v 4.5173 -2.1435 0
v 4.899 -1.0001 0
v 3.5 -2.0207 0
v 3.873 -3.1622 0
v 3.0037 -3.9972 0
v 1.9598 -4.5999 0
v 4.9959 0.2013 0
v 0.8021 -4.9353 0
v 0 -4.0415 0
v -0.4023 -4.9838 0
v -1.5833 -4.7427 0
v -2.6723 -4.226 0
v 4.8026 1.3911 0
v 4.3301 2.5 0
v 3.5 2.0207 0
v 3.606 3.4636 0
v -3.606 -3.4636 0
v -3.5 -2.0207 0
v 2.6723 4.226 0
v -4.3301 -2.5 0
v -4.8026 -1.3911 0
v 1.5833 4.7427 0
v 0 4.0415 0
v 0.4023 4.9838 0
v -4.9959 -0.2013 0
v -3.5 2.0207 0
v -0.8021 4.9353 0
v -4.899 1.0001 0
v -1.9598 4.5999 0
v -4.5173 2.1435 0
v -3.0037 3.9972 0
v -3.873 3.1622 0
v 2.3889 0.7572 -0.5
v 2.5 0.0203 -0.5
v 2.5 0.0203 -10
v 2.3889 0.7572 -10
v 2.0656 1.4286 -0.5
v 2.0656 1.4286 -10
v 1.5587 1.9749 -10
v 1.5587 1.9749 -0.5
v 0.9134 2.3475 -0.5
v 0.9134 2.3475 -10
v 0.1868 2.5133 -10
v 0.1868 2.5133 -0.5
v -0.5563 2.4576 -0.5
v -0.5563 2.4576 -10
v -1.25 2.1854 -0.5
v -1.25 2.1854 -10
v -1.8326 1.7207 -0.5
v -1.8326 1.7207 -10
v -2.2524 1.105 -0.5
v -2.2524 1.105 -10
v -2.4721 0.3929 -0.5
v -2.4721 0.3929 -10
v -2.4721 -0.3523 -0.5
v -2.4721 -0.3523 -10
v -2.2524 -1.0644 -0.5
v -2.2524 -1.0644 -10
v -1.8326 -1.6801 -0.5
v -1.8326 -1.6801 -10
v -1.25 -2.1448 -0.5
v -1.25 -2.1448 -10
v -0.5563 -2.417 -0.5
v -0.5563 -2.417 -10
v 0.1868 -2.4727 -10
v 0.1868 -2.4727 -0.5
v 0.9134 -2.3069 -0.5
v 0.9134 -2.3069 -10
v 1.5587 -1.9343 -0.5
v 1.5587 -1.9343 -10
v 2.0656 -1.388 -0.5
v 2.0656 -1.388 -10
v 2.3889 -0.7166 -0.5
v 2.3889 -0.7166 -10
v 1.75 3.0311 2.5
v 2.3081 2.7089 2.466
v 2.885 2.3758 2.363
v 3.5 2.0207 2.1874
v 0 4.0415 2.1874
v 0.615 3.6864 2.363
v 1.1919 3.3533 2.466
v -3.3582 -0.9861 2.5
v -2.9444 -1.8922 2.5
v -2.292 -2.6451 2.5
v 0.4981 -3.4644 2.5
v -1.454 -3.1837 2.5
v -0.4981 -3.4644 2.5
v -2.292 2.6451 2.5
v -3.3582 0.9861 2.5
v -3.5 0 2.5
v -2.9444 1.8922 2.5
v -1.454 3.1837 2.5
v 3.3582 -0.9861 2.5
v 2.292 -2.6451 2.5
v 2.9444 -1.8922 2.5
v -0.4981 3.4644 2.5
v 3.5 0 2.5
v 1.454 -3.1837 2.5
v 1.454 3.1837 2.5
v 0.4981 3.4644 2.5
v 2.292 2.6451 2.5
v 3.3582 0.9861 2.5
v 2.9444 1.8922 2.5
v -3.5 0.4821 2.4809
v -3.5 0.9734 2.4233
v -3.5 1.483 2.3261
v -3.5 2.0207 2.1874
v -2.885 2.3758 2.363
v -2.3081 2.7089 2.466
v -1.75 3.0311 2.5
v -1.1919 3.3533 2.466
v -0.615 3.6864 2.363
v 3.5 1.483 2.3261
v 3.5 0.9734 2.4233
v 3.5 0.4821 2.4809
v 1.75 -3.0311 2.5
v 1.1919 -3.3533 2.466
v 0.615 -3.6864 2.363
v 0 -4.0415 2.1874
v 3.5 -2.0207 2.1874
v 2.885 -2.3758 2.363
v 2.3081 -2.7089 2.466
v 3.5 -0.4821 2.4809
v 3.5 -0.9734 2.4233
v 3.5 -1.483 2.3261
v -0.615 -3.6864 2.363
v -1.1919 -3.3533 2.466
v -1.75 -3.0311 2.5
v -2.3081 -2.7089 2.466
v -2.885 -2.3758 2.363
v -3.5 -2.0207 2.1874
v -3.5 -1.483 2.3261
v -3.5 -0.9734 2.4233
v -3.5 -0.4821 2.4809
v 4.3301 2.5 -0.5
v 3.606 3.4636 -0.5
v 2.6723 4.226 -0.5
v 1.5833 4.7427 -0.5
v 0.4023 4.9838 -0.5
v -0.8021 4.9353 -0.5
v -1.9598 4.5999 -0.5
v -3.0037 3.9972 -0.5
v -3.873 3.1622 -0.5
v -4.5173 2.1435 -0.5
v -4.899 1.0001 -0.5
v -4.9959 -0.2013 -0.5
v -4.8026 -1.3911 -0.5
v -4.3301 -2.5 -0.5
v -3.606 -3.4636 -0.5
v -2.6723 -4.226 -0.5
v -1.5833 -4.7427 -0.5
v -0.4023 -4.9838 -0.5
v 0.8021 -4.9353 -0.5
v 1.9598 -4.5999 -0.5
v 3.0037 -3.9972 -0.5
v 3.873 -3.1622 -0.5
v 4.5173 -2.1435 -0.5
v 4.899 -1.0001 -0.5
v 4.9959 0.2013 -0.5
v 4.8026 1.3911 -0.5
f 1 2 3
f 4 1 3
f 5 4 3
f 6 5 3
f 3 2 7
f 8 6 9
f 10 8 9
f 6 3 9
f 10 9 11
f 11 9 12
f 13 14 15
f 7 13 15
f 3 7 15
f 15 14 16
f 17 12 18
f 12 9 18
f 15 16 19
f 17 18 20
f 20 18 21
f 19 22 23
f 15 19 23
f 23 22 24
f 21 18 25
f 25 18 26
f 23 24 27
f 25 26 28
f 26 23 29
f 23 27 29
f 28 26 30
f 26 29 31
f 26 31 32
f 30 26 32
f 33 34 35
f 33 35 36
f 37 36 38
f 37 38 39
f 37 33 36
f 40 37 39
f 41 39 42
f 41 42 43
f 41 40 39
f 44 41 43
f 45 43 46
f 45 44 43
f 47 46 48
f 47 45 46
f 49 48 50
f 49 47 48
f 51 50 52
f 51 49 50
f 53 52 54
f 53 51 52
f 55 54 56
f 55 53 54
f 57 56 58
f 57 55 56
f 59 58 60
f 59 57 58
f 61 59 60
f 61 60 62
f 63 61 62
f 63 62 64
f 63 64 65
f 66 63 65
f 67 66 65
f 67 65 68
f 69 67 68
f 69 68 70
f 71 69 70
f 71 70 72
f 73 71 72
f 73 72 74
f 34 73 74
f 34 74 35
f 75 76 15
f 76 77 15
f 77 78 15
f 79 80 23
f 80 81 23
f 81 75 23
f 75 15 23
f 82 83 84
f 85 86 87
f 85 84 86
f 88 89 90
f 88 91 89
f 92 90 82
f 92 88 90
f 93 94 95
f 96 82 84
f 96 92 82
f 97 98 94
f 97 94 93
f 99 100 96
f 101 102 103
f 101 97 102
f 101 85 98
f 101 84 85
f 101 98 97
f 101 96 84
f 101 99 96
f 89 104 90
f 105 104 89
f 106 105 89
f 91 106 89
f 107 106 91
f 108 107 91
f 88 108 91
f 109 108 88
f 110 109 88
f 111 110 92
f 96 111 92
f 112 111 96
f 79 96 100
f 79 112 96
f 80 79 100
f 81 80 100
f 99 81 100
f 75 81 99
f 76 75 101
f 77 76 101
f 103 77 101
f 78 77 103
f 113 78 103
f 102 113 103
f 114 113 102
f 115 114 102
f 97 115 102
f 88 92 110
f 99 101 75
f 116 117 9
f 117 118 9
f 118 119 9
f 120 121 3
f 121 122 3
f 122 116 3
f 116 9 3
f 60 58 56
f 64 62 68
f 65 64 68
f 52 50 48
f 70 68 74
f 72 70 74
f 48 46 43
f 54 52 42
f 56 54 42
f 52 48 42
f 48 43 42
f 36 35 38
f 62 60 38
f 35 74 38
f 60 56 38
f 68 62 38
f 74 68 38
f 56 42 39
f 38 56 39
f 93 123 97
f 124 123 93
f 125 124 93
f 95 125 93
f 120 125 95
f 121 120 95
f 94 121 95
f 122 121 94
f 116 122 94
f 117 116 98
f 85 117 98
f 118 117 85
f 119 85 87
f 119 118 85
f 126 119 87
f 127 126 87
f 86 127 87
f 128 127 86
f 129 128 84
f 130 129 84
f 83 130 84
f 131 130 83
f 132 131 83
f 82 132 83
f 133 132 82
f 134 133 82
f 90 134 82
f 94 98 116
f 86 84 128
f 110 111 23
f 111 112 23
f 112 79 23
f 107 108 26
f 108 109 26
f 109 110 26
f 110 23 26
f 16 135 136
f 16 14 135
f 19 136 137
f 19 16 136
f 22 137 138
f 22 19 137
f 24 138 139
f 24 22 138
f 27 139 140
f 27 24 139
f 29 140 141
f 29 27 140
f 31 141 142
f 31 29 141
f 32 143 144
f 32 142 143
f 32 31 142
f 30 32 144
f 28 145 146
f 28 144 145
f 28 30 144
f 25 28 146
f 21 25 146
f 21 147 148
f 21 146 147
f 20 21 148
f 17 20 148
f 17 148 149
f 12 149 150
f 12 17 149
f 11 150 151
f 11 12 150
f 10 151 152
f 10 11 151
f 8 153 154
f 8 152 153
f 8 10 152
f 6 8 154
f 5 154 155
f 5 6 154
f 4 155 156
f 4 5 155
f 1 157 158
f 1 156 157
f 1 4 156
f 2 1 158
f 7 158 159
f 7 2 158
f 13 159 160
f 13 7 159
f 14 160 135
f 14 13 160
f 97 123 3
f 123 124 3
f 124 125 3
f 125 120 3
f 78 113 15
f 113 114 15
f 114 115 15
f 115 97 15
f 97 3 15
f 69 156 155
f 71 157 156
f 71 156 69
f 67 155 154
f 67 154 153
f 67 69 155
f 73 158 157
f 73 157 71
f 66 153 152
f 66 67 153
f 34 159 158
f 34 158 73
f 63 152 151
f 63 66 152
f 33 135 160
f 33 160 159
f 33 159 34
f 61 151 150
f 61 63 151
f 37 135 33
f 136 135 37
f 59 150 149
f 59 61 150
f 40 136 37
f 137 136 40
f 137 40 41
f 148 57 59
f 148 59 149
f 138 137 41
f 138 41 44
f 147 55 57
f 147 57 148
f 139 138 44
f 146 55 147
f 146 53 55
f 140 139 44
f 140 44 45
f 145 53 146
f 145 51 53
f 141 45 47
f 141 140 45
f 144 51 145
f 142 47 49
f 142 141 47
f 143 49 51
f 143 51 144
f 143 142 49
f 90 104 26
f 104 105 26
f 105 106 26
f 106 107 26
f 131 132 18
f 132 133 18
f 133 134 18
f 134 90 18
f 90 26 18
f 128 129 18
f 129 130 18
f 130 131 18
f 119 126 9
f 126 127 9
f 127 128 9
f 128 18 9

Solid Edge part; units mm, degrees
sketch "Sketch1" plane through (0, 0, 0) normal (0, 0, 1) x (1, 0, 0)
  line L0 (0, -4.0415) -> (3.5, -2.0207)
  line L1 (3.5, -2.0207) -> (3.5, 2.0207)
  line L2 (3.5, 2.0207) -> (0, 4.0415)
  line L3 (0, 4.0415) -> (-3.5, 2.0207)
  line L4 (-3.5, 2.0207) -> (-3.5, -2.0207)
  line L5 (-3.5, -2.0207) -> (0, -4.0415)
extrude "Protrusion1" add sketch "Sketch1" along normal blind 2.5
sketch "Sketch2" plane through (0, 0, 0) normal (0, 0, -1) x (0.866, 0.5, 0)
  circle A0 centre (0, 0) radius 5
extrude "ExtrudedProtrusion_2" add sketch "Sketch2" along normal blind 0.5
extrude "Protrusion2" [suppressed]
sketch "Sketch3" plane through (0, 0, 0) normal (0, -1, 0) x (1, 0, 0)
  line L0 (7.8301, 2.5) -> (3.5, 2.5)
  line L1 (3.5, 2.5) -> (7.8301, 0)
  line L2 (7.8301, 0) -> (7.8301, 2.5)
revolve "RevolvedCutout1" cut sketch "Sketch3" angle 360 about axis through (0, 0, 10.8167) along (0, 0, -1)
sketch "Sketch4" plane through (0, 0, 0) normal (0, 0, 1) x (1, 0, 0)
  circle A0 centre (0, 0.0203) radius 2.5
extrude "Protrusion3" add sketch "Sketch4" against normal blind 10
